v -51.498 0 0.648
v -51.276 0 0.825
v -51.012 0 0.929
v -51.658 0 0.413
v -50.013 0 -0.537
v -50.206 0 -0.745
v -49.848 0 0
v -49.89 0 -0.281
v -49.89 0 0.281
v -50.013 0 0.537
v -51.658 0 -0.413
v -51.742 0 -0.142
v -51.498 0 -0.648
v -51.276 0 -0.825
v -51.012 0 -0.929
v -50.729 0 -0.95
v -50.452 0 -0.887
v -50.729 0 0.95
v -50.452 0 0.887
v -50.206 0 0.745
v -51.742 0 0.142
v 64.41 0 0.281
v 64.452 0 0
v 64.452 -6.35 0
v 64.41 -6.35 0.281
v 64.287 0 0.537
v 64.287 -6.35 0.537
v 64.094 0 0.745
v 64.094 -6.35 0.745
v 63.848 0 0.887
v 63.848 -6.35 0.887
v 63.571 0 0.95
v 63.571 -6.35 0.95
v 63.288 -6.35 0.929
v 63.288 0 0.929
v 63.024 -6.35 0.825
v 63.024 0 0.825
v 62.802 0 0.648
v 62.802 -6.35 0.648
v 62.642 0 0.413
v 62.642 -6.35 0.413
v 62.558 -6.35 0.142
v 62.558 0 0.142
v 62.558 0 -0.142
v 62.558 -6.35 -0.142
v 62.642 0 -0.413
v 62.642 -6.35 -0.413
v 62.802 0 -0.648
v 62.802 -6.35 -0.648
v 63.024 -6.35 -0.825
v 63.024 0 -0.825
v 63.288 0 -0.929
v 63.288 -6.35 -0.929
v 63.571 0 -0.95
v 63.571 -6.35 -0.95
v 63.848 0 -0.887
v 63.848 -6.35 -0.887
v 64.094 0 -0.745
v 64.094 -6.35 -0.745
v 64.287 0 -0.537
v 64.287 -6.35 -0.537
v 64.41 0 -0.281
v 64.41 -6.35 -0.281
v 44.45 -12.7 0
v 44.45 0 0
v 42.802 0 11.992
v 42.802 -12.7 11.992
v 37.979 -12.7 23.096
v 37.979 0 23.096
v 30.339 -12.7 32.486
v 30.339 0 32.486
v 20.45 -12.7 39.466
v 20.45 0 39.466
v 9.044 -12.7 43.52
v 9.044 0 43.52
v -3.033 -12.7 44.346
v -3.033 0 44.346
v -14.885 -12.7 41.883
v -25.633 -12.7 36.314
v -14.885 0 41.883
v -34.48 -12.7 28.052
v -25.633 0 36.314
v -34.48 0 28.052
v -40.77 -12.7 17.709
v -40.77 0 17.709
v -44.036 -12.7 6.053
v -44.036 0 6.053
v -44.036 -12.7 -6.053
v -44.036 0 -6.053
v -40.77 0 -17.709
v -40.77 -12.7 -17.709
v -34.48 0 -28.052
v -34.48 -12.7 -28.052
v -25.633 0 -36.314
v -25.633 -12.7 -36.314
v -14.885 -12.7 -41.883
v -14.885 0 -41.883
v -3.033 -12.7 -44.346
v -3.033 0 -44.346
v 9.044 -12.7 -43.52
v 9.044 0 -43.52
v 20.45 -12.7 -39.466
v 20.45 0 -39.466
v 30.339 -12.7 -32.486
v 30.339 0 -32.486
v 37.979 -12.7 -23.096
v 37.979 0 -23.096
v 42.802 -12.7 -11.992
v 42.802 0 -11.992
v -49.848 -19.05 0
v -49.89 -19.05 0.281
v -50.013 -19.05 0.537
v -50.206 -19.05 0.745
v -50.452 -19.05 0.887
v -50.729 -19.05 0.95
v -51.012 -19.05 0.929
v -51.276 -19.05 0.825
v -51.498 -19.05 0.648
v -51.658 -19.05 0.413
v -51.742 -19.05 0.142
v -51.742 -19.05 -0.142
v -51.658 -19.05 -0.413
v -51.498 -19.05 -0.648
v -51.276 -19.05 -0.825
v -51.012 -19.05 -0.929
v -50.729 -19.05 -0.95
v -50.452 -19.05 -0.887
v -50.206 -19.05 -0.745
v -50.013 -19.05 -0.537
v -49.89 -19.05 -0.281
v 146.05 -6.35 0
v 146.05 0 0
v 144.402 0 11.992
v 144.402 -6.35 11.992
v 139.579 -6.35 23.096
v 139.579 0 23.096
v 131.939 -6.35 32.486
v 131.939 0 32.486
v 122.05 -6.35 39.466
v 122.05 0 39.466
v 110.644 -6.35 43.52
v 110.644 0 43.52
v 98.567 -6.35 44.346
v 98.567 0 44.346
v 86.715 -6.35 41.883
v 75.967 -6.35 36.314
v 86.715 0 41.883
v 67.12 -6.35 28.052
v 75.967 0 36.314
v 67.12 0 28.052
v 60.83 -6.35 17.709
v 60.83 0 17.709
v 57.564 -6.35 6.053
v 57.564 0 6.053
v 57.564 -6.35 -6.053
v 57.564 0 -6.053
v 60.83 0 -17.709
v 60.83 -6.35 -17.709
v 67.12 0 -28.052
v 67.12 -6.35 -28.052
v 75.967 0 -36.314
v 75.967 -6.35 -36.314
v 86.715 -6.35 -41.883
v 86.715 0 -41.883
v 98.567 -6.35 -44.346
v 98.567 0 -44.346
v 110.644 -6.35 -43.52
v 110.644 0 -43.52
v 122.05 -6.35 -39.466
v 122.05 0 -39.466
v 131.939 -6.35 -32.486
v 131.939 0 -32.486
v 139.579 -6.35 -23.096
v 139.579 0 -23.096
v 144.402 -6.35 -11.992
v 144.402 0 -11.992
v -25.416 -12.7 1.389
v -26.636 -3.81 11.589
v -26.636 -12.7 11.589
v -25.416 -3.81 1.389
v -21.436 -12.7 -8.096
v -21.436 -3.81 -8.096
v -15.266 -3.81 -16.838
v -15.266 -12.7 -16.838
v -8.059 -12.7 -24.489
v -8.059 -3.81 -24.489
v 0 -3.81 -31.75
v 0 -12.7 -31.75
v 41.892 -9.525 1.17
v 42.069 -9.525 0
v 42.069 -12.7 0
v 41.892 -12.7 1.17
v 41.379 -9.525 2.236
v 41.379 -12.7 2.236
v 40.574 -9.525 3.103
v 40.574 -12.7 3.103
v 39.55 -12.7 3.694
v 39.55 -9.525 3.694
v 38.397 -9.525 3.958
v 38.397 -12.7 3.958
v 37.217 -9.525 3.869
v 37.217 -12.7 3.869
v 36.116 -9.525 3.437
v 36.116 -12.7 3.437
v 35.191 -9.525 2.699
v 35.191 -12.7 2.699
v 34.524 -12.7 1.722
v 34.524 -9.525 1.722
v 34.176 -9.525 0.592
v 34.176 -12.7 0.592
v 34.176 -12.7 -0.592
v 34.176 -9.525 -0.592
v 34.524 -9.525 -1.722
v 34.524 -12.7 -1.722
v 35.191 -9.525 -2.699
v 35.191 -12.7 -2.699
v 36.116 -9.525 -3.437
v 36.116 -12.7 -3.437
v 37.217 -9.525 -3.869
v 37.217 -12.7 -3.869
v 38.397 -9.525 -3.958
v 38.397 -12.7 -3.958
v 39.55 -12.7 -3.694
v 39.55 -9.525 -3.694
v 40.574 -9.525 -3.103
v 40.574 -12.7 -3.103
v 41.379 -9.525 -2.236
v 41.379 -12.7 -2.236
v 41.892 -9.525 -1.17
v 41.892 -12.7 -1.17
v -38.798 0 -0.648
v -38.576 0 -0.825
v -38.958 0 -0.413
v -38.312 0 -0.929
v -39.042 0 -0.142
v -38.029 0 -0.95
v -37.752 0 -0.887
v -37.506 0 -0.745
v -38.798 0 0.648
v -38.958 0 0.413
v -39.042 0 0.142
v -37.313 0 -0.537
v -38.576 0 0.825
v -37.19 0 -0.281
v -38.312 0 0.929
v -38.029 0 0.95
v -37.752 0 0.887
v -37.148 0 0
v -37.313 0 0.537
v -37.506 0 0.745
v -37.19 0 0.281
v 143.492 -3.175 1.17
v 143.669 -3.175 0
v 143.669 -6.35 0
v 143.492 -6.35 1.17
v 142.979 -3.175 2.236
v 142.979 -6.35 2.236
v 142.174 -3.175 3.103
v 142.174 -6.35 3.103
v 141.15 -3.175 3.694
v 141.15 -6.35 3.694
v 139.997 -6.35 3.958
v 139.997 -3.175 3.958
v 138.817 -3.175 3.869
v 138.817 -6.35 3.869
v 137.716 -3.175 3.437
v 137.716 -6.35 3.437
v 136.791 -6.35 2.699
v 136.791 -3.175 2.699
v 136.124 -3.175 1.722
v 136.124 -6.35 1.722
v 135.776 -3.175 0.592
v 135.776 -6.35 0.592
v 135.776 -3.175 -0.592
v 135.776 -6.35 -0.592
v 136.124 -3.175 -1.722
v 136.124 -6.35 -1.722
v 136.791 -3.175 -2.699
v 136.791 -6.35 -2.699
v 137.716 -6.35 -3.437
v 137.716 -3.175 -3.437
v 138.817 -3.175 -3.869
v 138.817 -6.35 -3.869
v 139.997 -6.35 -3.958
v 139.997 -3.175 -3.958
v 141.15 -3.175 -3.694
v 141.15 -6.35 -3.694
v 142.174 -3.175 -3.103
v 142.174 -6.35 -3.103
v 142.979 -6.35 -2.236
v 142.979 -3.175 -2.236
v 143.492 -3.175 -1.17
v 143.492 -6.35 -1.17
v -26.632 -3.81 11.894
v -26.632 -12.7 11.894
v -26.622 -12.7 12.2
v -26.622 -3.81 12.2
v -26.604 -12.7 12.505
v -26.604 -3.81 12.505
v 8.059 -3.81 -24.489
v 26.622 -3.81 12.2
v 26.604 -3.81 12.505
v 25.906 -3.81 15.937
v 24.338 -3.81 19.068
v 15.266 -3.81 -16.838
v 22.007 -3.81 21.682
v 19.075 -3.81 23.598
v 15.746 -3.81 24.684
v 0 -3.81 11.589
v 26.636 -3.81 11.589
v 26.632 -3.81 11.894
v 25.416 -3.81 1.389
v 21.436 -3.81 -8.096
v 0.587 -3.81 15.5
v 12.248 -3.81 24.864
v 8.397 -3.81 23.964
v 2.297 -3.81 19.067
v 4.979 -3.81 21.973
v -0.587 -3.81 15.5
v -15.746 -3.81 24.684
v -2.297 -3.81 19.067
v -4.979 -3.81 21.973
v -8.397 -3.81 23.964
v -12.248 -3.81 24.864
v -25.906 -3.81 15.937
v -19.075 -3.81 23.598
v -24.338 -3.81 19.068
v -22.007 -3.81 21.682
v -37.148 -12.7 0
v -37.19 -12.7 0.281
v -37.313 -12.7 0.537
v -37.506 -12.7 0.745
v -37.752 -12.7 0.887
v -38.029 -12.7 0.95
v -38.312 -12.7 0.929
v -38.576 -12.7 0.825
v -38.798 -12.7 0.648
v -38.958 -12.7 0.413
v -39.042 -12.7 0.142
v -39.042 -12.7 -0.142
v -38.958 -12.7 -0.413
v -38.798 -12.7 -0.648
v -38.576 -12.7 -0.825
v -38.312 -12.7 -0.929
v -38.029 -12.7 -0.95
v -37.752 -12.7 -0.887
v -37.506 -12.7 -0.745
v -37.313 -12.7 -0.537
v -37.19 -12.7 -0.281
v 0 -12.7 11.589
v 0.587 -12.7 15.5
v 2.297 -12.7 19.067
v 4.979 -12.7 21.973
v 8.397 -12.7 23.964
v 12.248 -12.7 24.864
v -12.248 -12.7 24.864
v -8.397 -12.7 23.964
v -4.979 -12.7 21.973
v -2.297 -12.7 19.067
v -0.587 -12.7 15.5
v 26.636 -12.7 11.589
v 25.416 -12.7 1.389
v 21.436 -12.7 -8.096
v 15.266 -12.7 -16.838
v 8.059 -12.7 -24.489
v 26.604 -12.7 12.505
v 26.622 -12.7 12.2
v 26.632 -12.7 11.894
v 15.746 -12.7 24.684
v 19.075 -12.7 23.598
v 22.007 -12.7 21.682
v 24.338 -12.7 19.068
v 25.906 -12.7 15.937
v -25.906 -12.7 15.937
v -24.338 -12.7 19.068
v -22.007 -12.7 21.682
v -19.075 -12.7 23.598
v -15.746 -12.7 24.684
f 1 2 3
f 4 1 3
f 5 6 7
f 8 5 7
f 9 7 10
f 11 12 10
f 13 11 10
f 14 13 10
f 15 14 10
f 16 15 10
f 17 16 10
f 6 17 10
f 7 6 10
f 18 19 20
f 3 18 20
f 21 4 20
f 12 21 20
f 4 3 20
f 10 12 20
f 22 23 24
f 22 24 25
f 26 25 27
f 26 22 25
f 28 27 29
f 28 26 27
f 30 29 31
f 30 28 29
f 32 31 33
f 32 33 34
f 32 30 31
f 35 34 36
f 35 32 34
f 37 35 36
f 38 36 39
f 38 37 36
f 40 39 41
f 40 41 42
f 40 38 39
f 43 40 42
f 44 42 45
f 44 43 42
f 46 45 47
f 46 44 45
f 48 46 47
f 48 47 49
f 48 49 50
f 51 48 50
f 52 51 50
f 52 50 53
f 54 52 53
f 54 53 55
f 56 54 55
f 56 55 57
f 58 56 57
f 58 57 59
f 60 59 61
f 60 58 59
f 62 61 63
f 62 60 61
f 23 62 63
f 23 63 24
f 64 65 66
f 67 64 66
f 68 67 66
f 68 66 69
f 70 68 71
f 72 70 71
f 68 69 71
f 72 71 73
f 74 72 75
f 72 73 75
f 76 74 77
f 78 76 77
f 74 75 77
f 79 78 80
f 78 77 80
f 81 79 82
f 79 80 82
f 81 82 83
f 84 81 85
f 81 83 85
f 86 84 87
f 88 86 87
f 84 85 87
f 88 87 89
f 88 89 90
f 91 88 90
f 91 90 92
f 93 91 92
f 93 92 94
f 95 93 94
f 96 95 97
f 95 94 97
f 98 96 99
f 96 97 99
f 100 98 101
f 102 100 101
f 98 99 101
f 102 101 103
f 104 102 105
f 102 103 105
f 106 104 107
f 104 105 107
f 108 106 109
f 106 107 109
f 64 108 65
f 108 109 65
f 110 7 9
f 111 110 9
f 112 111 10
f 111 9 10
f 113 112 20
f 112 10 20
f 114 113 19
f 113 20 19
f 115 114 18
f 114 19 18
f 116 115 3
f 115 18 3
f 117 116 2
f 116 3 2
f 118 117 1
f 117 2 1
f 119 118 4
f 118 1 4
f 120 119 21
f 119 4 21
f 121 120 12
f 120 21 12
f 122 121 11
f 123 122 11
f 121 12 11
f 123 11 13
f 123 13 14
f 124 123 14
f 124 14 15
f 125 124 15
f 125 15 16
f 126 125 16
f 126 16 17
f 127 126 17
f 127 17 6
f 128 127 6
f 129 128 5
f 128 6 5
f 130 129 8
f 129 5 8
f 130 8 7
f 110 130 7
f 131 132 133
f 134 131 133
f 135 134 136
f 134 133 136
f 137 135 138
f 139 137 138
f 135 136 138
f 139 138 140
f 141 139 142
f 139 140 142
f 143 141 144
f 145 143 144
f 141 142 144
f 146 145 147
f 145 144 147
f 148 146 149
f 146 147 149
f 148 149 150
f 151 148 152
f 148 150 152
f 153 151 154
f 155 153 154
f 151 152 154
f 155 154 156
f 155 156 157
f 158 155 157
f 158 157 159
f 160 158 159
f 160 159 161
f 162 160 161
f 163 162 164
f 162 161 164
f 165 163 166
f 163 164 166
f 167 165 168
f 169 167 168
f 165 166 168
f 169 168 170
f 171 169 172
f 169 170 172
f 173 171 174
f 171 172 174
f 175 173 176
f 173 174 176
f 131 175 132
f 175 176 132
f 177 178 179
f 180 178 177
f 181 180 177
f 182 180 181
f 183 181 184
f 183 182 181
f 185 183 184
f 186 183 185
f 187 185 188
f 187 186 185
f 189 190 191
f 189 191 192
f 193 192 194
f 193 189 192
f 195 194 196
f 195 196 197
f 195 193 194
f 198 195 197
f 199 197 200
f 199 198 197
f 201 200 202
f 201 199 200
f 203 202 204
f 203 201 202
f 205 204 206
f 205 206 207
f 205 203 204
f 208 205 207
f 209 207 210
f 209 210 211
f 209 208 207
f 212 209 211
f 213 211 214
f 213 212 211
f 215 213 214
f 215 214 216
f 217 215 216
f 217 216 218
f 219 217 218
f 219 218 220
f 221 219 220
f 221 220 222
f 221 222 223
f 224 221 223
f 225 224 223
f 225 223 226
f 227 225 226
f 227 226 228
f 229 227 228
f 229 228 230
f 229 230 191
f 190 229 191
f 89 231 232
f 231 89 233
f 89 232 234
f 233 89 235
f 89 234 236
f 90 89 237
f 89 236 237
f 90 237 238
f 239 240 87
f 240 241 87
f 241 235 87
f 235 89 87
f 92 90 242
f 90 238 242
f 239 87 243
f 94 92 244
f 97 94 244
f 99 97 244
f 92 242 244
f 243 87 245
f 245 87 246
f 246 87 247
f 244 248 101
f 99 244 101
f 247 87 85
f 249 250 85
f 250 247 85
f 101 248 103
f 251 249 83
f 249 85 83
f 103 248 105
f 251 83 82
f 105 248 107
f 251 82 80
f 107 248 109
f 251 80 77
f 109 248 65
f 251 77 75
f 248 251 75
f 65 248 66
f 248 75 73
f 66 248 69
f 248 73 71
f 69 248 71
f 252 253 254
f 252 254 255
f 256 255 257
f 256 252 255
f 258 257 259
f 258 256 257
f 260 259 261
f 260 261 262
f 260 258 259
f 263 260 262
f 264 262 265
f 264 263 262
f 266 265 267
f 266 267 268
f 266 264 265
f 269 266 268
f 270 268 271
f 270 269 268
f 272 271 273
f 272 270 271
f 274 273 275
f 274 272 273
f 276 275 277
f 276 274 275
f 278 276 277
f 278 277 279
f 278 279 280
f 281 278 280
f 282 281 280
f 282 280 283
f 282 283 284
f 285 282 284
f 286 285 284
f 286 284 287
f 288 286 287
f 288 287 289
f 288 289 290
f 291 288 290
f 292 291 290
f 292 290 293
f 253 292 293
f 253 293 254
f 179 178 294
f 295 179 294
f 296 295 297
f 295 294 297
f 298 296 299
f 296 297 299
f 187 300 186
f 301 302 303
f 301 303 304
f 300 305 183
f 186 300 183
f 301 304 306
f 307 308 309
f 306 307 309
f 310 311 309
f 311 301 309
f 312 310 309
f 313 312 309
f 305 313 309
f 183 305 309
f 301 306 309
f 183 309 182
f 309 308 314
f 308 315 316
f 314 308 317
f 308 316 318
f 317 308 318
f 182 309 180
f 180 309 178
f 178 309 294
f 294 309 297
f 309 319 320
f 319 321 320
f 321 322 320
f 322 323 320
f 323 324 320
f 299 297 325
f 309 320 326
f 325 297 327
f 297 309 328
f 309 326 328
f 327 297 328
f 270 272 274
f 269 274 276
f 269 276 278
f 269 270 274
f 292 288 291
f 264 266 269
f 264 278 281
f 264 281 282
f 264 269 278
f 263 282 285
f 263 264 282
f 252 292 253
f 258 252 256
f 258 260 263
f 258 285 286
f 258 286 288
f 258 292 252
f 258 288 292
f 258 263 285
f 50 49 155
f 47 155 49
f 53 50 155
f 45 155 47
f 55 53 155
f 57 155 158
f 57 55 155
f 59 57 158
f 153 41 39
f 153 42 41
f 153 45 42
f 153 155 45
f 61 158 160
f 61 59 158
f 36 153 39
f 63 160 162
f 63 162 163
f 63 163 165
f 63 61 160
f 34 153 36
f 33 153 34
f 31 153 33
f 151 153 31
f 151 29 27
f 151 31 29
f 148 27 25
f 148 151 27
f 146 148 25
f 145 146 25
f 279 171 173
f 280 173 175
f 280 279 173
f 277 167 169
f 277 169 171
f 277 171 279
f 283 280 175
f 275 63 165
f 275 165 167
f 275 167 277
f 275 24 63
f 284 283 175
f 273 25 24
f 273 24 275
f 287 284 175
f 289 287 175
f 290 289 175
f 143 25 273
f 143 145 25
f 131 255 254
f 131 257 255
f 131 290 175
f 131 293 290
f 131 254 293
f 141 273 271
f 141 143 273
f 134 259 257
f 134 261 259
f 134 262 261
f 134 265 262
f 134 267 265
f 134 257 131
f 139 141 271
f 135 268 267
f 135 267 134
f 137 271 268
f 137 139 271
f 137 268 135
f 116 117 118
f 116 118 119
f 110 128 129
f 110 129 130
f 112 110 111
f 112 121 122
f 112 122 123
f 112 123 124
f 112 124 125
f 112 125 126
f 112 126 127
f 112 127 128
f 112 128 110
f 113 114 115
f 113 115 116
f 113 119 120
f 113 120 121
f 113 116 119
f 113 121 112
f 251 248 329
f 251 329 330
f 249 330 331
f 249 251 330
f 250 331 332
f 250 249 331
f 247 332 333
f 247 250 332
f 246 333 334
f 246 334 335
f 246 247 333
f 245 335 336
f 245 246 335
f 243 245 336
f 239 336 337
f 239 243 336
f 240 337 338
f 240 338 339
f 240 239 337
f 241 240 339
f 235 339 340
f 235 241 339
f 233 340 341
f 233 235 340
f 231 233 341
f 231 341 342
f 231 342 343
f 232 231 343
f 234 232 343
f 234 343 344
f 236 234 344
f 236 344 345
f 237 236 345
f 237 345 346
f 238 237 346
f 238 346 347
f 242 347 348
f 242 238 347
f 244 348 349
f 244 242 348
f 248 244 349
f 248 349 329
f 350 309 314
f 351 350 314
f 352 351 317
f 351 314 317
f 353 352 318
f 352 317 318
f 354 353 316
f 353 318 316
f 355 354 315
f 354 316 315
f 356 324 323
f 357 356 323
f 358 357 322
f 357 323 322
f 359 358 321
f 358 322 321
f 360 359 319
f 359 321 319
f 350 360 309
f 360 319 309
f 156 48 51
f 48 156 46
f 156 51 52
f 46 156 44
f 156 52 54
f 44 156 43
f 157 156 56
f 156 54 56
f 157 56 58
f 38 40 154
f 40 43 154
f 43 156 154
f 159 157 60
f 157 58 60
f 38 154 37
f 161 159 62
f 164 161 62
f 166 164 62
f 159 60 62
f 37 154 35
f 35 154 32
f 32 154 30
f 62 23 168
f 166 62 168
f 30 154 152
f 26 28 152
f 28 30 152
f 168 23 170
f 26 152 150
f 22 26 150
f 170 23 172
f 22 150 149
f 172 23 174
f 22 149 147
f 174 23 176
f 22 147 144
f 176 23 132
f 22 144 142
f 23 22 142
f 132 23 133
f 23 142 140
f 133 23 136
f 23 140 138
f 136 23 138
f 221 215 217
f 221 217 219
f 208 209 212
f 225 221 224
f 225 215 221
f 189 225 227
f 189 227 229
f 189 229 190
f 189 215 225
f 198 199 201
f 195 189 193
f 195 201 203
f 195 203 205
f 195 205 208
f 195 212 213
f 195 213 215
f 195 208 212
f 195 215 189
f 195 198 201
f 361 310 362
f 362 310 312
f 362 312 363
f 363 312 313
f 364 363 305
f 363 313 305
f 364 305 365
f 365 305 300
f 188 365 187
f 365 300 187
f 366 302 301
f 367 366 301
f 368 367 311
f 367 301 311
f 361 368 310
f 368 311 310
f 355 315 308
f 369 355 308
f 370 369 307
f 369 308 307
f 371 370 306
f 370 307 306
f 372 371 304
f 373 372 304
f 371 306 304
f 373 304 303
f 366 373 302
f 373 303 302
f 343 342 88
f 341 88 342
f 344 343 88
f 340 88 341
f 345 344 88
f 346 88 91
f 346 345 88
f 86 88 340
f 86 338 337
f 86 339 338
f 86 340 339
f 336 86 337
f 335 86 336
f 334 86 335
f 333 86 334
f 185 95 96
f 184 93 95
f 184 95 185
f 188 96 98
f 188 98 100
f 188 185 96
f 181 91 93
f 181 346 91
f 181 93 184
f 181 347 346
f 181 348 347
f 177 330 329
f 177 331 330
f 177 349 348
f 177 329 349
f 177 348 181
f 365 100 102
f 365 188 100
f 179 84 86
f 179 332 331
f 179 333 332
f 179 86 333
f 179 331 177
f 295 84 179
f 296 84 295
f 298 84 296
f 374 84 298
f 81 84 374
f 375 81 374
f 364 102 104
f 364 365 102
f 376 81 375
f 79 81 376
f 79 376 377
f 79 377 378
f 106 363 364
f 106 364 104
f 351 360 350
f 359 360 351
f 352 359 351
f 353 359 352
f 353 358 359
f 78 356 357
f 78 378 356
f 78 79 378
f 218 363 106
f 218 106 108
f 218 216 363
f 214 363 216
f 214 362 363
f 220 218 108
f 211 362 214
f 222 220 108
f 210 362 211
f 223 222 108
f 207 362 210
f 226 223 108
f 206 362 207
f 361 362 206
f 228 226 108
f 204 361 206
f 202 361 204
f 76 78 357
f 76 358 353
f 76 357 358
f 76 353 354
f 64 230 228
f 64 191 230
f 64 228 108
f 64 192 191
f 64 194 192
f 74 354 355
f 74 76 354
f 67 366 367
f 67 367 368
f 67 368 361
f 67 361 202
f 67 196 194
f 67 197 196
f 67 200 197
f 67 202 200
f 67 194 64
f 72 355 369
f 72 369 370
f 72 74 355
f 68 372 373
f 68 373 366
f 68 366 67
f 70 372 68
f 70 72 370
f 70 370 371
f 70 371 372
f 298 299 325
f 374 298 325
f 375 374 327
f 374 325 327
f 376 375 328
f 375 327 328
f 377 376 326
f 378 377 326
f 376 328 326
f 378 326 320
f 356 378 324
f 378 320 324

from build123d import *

# Parameters (mm, degrees)
F0_R     = 44.45
F0_R_2   = 0.9525
F0_R_3   = 3.96875
F1_DEPTH = 12.7
F2_DEPTH = 3.81
F3_DEPTH = 9.525
F4_DEPTH = 6.35
F5_DEPTH = 3.175
F6_DEPTH = 19.05


with BuildPart() as f1:
    # F0 (on Front) → F1 (new body)
    with BuildSketch(Plane.XZ):
        Circle(F0_R)
        with BuildLine():
            ThreePointArc((-12.2481151241, 24.8639554142), (-3.5297989426, 20.6200957751), (0, 11.5890437267))
            ThreePointArc((0, 11.5890437267), (3.5297989426, 20.6200957751), (12.2481151241, 24.8639554142))
            add(Edge.make_bspline(
                [(12.2481151241, 24.8639554142), (14.6922572571, 26.4350209104), (22.4074488188, 29.3295793858), (26.2533609705, 19.9457695703), (26.6043971909, 12.5045702251)],
                knots=[0.201568932, 0.201568932, 0.201568932, 0.201568932, 0.3004267747, 0.5168406107, 0.5168406107, 0.5168406107, 0.5168406107], degree=3))
            ThreePointArc((26.6043971909, 12.5045702251), (26.6280240963, 12.0470779435), (26.6359028388, 11.5890437267))
            add(Edge.make_bspline(
                [(26.6359028388, 11.5890437267), (26.6898066873, 9.1110835654), (25.3801041465, -7.941133268), (12.2456271202, -21.2775729597), (0, -31.75)],
                knots=[0.5256708302, 0.5256708302, 0.5256708302, 0.5256708302, 0.5970317864, 1, 1, 1, 1], degree=3))
            add(Edge.make_bspline(
                [(-26.6359028388, 11.5890437267), (-26.6898066873, 9.1110835654), (-25.3801041465, -7.941133268), (-12.2456271202, -21.2775729597), (0, -31.75)],
                knots=[0.5256708302, 0.5256708302, 0.5256708302, 0.5256708302, 0.5970317864, 1, 1, 1, 1], degree=3))
            ThreePointArc((-26.6359028388, 11.5890437267), (-26.6280240963, 12.0470779435), (-26.6043971909, 12.5045702251))
            add(Edge.make_bspline(
                [(-12.2481151241, 24.8639554142), (-14.6922572571, 26.4350209104), (-22.4074488188, 29.3295793858), (-26.2533609705, 19.9457695703), (-26.6043971909, 12.5045702251)],
                knots=[0.201568932, 0.201568932, 0.201568932, 0.201568932, 0.3004267747, 0.5168406107, 0.5168406107, 0.5168406107, 0.5168406107], degree=3))
        make_face(mode=Mode.SUBTRACT)
        with Locations((-38.1, 0)):
            Circle(F0_R_2, mode=Mode.SUBTRACT)
        with Locations((38.1, 0)):
            Circle(F0_R_3, mode=Mode.SUBTRACT)
        with BuildLine():
            ThreePointArc((-26.6043971909, 12.5045702251), (-22.0070242892, 21.6820037817), (-12.2481151241, 24.8639554142))
            add(Edge.make_bspline(
                [(-12.2481151241, 24.8639554142), (-14.6922572571, 26.4350209104), (-22.4074488188, 29.3295793858), (-26.2533609705, 19.9457695703), (-26.6043971909, 12.5045702251)],
                knots=[0.201568932, 0.201568932, 0.201568932, 0.201568932, 0.3004267747, 0.5168406107, 0.5168406107, 0.5168406107, 0.5168406107], degree=3))
        make_face()
        with BuildLine():
            add(Edge.make_bspline(
                [(12.2481151241, 24.8639554142), (14.6922572571, 26.4350209104), (22.4074488188, 29.3295793858), (26.2533609705, 19.9457695703), (26.6043971909, 12.5045702251)],
                knots=[0.201568932, 0.201568932, 0.201568932, 0.201568932, 0.3004267747, 0.5168406107, 0.5168406107, 0.5168406107, 0.5168406107], degree=3))
            ThreePointArc((12.2481151241, 24.8639554142), (22.0070242892, 21.6820037817), (26.6043971909, 12.5045702251))
        make_face()
    extrude(amount=F1_DEPTH)

    # F0 (on Front) → F2 (join)
    with BuildSketch(Plane.XZ):
        with BuildLine():
            add(Edge.make_bspline(
                [(0, 11.5890437267), (-2.1773432855, 15.6990310035), (-7.2645639382, 21.6605879785), (-12.2481151241, 24.8639554142)],
                knots=[0, 0, 0, 0, 0.201568932, 0.201568932, 0.201568932, 0.201568932], degree=3))
            ThreePointArc((0, 11.5890437267), (-3.5297989426, 20.6200957751), (-12.2481151241, 24.8639554142))
        make_face()
        with BuildLine():
            add(Edge.make_bspline(
                [(0, 11.5890437267), (2.1773432855, 15.6990310035), (7.2645639382, 21.6605879785), (12.2481151241, 24.8639554142)],
                knots=[0, 0, 0, 0, 0.201568932, 0.201568932, 0.201568932, 0.201568932], degree=3))
            add(Edge.make_bspline(
                [(0, 11.5890437267), (-2.1773432855, 15.6990310035), (-7.2645639382, 21.6605879785), (-12.2481151241, 24.8639554142)],
                knots=[0, 0, 0, 0, 0.201568932, 0.201568932, 0.201568932, 0.201568932], degree=3))
            ThreePointArc((-12.2481151241, 24.8639554142), (-22.0070242892, 21.6820037817), (-26.6043971909, 12.5045702251))
            add(Edge.make_bspline(
                [(-26.6043971909, 12.5045702251), (-26.6187203366, 12.2009508949), (-26.6292327654, 11.8956670321), (-26.6359028388, 11.5890437267)],
                knots=[0.5168406107, 0.5168406107, 0.5168406107, 0.5168406107, 0.5256708302, 0.5256708302, 0.5256708302, 0.5256708302], degree=3))
            add(Edge.make_bspline(
                [(-26.6359028388, 11.5890437267), (-26.6898066873, 9.1110835654), (-25.3801041465, -7.941133268), (-12.2456271202, -21.2775729597), (0, -31.75)],
                knots=[0.5256708302, 0.5256708302, 0.5256708302, 0.5256708302, 0.5970317864, 1, 1, 1, 1], degree=3))
            add(Edge.make_bspline(
                [(26.6359028388, 11.5890437267), (26.6898066873, 9.1110835654), (25.3801041465, -7.941133268), (12.2456271202, -21.2775729597), (0, -31.75)],
                knots=[0.5256708302, 0.5256708302, 0.5256708302, 0.5256708302, 0.5970317864, 1, 1, 1, 1], degree=3))
            add(Edge.make_bspline(
                [(26.6043971909, 12.5045702251), (26.6187203366, 12.2009508949), (26.6292327654, 11.8956670321), (26.6359028388, 11.5890437267)],
                knots=[0.5168406107, 0.5168406107, 0.5168406107, 0.5168406107, 0.5256708302, 0.5256708302, 0.5256708302, 0.5256708302], degree=3))
            ThreePointArc((26.6043971909, 12.5045702251), (22.0070242892, 21.6820037817), (12.2481151241, 24.8639554142))
        make_face()
        with BuildLine():
            ThreePointArc((12.2481151241, 24.8639554142), (3.5297989426, 20.6200957751), (0, 11.5890437267))
            add(Edge.make_bspline(
                [(0, 11.5890437267), (2.1773432855, 15.6990310035), (7.2645639382, 21.6605879785), (12.2481151241, 24.8639554142)],
                knots=[0, 0, 0, 0, 0.201568932, 0.201568932, 0.201568932, 0.201568932], degree=3))
        make_face()
        with BuildLine():
            ThreePointArc((-26.6043971909, 12.5045702251), (-22.0070242892, 21.6820037817), (-12.2481151241, 24.8639554142))
            add(Edge.make_bspline(
                [(-12.2481151241, 24.8639554142), (-14.6922572571, 26.4350209104), (-22.4074488188, 29.3295793858), (-26.2533609705, 19.9457695703), (-26.6043971909, 12.5045702251)],
                knots=[0.201568932, 0.201568932, 0.201568932, 0.201568932, 0.3004267747, 0.5168406107, 0.5168406107, 0.5168406107, 0.5168406107], degree=3))
        make_face()
        with BuildLine():
            add(Edge.make_bspline(
                [(12.2481151241, 24.8639554142), (14.6922572571, 26.4350209104), (22.4074488188, 29.3295793858), (26.2533609705, 19.9457695703), (26.6043971909, 12.5045702251)],
                knots=[0.201568932, 0.201568932, 0.201568932, 0.201568932, 0.3004267747, 0.5168406107, 0.5168406107, 0.5168406107, 0.5168406107], degree=3))
            ThreePointArc((12.2481151241, 24.8639554142), (22.0070242892, 21.6820037817), (26.6043971909, 12.5045702251))
        make_face()
        with BuildLine():
            add(Edge.make_bspline(
                [(-26.6043971909, 12.5045702251), (-26.6187203366, 12.2009508949), (-26.6292327654, 11.8956670321), (-26.6359028388, 11.5890437267)],
                knots=[0.5168406107, 0.5168406107, 0.5168406107, 0.5168406107, 0.5256708302, 0.5256708302, 0.5256708302, 0.5256708302], degree=3))
            ThreePointArc((-26.6043971909, 12.5045702251), (-26.6280240963, 12.0470779435), (-26.6359028388, 11.5890437267))
        make_face()
        with BuildLine():
            ThreePointArc((26.6359028388, 11.5890437267), (26.6280240963, 12.0470779435), (26.6043971909, 12.5045702251))
            add(Edge.make_bspline(
                [(26.6043971909, 12.5045702251), (26.6187203366, 12.2009508949), (26.6292327654, 11.8956670321), (26.6359028388, 11.5890437267)],
                knots=[0.5168406107, 0.5168406107, 0.5168406107, 0.5168406107, 0.5256708302, 0.5256708302, 0.5256708302, 0.5256708302], degree=3))
        make_face()
    extrude(amount=F2_DEPTH)

    # F0 (on Front) → F3 (join)
    with BuildSketch(Plane.XZ):
        with Locations((38.1, 0)):
            Circle(F0_R_3)
    extrude(amount=F3_DEPTH)


with BuildPart() as f4:
    # F0 (on Front) → F4 (new body)
    with BuildSketch(Plane.XZ):
        with Locations((101.6, 0)):
            Circle(F0_R)
        with Locations((63.5, 0)):
            Circle(F0_R_2, mode=Mode.SUBTRACT)
        with Locations((139.7, 0)):
            Circle(F0_R_3, mode=Mode.SUBTRACT)
    extrude(amount=F4_DEPTH)

    # F0 (on Front) → F5 (join)
    with BuildSketch(Plane.XZ):
        with Locations((139.7, 0)):
            Circle(F0_R_3)
    extrude(amount=F5_DEPTH)


with BuildPart() as f6:
    # F0 (on Front) → F6 (new body)
    with BuildSketch(Plane.XZ):
        with Locations((-50.8, 0)):
            Circle(F0_R_2)
    extrude(amount=F6_DEPTH)


solid = Compound([f1.part, f4.part, f6.part])
